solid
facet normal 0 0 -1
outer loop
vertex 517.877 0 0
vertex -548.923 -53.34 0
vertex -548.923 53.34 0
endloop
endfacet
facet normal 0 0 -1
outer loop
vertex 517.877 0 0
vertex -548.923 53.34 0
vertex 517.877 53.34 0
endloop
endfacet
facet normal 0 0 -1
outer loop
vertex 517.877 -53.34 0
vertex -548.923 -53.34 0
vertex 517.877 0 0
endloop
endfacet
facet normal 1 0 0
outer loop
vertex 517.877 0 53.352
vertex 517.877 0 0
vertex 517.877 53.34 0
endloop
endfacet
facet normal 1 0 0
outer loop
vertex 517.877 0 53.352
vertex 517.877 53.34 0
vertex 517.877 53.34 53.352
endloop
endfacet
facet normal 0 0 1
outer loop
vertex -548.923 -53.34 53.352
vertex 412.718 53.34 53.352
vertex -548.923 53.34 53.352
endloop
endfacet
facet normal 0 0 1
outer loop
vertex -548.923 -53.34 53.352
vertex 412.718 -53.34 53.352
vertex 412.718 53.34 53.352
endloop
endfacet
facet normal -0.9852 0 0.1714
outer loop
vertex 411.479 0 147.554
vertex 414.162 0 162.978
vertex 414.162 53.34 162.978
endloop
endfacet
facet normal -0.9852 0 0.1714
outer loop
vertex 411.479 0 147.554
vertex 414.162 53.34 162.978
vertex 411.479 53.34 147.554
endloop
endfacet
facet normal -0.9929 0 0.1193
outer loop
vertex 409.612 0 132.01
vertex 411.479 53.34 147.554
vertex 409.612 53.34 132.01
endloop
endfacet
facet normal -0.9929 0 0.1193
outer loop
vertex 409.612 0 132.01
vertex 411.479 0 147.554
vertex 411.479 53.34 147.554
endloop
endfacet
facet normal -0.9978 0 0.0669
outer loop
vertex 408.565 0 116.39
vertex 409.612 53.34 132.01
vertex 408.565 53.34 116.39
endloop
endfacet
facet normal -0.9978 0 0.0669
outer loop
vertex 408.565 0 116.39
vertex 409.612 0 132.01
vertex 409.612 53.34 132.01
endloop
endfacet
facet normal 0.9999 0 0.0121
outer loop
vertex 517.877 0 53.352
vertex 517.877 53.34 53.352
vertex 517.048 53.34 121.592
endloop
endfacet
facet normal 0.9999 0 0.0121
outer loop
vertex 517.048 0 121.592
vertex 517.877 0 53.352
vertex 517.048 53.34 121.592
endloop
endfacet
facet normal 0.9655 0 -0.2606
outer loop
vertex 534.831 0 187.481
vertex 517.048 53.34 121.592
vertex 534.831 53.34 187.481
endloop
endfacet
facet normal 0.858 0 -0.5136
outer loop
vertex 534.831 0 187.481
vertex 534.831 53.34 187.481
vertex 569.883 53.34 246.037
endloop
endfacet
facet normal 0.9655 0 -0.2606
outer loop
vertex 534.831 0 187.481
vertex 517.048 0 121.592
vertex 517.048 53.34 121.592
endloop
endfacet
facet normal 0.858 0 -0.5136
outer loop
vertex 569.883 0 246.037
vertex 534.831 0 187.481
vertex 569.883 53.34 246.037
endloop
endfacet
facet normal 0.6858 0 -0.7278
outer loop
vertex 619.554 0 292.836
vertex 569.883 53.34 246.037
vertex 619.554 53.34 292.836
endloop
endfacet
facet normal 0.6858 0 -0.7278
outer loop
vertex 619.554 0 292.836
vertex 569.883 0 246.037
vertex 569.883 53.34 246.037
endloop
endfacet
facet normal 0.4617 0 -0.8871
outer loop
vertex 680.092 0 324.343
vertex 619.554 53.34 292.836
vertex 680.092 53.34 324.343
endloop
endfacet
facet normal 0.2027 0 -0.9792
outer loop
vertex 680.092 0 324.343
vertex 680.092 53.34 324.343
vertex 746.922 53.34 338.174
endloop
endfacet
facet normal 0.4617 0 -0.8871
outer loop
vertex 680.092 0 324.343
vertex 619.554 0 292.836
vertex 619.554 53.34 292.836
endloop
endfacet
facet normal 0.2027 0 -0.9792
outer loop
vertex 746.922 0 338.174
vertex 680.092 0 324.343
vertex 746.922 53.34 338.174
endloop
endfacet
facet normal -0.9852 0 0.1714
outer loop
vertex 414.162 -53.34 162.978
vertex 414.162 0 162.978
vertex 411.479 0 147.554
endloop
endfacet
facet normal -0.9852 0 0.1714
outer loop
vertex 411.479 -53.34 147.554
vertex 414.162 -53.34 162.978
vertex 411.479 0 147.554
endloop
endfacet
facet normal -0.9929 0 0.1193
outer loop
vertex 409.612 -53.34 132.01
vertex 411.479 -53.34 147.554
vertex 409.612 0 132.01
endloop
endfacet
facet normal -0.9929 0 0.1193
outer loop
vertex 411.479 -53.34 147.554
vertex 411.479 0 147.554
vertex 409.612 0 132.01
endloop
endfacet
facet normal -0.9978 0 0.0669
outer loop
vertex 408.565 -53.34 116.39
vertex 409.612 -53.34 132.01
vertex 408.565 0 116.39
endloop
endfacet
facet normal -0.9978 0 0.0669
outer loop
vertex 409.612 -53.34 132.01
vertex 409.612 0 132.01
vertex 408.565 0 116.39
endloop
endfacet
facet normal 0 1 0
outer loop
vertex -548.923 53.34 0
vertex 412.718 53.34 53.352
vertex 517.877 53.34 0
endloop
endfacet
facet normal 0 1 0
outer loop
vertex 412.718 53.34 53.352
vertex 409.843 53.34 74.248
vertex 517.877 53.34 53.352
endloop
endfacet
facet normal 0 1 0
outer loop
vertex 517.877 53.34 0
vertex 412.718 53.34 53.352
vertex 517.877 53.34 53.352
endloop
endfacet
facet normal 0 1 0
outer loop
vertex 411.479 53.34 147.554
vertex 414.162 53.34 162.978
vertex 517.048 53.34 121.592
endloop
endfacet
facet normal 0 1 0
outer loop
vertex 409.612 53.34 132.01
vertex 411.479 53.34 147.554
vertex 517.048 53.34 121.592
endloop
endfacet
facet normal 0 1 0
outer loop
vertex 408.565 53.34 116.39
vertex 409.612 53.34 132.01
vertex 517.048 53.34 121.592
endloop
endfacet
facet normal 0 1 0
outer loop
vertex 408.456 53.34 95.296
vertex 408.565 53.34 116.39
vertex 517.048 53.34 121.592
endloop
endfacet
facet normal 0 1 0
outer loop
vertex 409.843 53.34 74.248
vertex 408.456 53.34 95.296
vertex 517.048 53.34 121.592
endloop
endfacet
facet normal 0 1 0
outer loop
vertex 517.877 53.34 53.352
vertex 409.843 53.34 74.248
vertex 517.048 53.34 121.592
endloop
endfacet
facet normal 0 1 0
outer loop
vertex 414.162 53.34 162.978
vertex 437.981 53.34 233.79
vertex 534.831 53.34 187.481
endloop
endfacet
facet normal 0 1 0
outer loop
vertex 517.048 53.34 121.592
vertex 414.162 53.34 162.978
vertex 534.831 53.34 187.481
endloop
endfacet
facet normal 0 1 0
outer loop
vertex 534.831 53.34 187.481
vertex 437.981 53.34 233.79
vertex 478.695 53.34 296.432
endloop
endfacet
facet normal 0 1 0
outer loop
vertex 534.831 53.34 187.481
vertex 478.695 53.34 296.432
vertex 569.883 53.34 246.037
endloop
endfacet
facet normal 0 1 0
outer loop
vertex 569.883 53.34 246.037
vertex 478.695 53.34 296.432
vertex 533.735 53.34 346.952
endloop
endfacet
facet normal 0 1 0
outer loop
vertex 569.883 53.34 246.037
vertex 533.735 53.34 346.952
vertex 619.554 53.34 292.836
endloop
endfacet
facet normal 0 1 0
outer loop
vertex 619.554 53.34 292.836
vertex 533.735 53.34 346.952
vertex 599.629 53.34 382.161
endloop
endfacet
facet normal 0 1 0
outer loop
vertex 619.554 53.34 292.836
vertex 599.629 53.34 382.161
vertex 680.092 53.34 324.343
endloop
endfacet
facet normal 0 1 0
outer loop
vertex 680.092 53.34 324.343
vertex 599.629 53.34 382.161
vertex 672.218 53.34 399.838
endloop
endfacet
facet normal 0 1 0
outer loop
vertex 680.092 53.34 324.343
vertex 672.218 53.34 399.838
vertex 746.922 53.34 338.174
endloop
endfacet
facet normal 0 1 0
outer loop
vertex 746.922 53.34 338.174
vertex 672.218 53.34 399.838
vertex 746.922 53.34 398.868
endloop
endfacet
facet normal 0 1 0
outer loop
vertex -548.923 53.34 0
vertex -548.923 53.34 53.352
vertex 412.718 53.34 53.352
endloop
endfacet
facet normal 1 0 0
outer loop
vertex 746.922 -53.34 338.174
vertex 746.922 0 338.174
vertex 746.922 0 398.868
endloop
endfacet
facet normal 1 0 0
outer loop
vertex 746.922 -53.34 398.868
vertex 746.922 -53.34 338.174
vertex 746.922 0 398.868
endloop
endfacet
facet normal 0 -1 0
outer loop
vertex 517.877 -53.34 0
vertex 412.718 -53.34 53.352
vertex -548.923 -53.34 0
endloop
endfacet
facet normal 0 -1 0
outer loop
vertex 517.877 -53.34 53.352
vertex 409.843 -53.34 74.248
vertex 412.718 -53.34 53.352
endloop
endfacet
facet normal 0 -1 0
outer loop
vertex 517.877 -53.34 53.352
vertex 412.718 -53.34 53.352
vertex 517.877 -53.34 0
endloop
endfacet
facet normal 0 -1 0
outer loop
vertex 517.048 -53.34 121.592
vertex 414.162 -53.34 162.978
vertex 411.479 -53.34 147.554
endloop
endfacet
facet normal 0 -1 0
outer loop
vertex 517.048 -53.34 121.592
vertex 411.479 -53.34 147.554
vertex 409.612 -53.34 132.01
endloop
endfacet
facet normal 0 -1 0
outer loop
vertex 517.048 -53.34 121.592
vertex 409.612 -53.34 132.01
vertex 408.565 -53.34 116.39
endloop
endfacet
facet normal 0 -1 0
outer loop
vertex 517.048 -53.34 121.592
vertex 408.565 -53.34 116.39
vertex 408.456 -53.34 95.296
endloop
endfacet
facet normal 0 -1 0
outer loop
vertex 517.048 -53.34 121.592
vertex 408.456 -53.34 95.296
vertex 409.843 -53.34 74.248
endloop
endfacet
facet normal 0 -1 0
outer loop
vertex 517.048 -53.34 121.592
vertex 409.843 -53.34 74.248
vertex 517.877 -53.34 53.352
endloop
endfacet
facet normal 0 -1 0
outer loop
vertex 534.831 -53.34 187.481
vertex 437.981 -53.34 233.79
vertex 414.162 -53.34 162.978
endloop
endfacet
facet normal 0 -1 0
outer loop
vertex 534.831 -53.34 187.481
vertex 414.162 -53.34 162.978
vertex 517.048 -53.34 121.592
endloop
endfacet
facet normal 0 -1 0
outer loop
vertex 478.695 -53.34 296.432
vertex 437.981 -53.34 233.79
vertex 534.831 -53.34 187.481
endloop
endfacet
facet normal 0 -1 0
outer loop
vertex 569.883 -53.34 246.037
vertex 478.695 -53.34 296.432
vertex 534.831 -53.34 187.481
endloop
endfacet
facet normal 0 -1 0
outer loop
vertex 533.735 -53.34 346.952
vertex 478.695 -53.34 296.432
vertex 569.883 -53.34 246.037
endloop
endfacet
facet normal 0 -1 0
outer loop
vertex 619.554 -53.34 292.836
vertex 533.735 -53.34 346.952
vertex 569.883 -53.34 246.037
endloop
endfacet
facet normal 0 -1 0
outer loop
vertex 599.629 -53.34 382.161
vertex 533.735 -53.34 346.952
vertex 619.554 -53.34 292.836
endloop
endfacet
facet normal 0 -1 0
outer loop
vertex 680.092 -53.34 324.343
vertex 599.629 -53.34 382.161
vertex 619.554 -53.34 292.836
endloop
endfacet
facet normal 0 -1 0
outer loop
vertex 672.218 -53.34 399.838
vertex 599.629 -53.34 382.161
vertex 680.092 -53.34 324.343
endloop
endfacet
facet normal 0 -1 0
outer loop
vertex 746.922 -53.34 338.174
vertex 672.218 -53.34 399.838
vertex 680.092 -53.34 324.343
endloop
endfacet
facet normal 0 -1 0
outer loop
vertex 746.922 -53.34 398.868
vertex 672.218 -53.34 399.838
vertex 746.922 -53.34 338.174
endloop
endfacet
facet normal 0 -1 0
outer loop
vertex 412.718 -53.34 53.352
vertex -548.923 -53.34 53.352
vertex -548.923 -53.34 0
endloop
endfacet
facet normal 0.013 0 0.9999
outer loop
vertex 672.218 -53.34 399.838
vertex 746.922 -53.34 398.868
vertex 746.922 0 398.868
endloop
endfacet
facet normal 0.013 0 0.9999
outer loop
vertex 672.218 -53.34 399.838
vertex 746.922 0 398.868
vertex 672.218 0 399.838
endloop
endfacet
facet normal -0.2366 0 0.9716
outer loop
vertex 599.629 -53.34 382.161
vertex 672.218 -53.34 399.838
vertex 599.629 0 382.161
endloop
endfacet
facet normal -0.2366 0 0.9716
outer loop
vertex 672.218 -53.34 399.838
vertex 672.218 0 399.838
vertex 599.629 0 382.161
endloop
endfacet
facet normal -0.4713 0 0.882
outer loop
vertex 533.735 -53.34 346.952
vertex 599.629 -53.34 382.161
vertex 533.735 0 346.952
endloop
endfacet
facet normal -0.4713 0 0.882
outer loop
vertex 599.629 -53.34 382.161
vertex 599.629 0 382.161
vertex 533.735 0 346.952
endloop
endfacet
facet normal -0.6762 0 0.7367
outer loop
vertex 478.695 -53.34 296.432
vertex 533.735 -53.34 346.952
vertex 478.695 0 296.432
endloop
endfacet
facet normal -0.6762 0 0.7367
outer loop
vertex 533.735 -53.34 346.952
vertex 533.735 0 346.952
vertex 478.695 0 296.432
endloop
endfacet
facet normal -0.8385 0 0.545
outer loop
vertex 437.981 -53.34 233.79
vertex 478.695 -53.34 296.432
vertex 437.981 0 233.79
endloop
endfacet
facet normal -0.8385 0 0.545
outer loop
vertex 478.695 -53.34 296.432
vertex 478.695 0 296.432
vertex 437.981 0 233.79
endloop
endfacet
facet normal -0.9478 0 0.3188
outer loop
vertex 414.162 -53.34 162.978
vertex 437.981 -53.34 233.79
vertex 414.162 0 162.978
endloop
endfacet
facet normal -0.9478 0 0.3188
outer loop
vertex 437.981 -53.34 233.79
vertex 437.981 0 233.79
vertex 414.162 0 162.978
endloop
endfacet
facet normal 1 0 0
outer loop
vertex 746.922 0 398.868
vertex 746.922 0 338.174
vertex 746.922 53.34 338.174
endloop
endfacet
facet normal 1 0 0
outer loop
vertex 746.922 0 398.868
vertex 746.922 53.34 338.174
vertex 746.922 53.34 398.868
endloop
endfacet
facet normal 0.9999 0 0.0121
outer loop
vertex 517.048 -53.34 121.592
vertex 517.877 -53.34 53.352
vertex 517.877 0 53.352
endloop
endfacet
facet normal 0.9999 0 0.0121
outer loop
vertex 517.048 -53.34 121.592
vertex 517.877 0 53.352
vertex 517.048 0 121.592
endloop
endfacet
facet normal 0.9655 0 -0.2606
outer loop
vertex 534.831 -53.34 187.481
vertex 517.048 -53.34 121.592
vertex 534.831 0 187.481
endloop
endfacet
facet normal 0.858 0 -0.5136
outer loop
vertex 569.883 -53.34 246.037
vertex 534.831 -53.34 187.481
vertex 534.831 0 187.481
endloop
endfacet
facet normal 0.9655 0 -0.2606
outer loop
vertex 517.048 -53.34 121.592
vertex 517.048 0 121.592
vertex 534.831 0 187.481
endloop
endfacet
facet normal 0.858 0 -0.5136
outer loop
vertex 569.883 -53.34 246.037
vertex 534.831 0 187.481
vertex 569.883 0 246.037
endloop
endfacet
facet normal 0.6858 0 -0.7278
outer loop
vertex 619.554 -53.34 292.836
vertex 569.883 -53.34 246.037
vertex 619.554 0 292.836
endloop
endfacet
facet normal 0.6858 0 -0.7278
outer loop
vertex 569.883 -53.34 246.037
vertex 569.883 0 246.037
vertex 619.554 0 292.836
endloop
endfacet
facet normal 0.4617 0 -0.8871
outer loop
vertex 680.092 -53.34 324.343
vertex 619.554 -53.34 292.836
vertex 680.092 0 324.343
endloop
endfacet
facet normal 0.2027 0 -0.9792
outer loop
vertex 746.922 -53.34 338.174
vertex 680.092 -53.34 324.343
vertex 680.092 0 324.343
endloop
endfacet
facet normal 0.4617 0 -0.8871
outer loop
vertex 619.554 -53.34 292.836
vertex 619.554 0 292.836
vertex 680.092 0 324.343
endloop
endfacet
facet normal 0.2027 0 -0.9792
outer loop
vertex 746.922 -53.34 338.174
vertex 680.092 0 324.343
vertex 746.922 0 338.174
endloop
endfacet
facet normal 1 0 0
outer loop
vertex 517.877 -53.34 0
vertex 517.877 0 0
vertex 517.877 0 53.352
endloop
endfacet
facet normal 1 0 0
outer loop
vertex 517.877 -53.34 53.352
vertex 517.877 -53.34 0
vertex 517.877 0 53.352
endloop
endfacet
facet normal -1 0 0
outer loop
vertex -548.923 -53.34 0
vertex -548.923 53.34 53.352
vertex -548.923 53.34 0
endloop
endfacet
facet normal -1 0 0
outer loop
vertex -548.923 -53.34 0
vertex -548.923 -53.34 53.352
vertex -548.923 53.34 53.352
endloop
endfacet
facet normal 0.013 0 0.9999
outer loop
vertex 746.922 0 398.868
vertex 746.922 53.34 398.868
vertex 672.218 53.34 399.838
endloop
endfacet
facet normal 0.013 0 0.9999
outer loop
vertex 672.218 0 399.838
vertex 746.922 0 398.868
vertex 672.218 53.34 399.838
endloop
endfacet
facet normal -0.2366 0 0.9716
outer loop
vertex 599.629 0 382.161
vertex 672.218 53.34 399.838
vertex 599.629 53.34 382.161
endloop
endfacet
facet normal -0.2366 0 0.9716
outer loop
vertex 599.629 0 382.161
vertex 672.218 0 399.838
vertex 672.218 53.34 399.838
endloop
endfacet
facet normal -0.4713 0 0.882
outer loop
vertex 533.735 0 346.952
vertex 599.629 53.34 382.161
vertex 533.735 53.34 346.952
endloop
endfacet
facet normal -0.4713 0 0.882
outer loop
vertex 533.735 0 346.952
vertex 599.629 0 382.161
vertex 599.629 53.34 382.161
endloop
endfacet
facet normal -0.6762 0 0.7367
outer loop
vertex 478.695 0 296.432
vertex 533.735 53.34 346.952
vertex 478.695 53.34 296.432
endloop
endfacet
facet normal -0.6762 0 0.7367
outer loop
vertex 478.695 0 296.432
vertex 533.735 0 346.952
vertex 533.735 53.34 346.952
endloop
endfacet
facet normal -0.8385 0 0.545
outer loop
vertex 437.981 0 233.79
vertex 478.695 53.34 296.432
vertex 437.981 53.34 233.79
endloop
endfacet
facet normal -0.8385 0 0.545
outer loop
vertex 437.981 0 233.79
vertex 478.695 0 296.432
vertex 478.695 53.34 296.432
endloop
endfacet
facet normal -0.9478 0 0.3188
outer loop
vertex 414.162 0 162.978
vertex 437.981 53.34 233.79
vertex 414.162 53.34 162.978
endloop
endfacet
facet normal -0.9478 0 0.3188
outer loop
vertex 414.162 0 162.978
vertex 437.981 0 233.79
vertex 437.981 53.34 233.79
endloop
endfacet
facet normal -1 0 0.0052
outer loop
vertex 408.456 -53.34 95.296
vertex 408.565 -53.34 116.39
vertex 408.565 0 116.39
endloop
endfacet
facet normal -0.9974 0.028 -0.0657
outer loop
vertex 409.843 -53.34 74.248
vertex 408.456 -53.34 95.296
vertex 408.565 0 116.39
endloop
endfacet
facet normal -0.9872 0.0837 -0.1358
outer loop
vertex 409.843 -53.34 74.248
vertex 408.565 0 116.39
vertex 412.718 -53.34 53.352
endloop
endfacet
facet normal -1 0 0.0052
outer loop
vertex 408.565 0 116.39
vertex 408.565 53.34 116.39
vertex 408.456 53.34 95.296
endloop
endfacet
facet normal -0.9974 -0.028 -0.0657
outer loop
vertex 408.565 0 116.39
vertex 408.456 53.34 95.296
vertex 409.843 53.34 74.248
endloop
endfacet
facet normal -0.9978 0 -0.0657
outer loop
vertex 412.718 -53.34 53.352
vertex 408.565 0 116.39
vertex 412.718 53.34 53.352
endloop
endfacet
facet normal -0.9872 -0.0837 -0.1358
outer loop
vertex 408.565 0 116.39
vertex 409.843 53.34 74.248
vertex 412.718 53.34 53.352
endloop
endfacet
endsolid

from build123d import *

# Parameters (mm, degrees)
F4_DEPTH = 53.34


# Not quite as in the source:
# - the program builds the solid bodies; features that only make, move or delete a surface that nothing else refers to are left out


with BuildPart() as f4:
    # F0 (on Front) → F4 (new body, symmetric)
    with BuildSketch(Plane.XZ):
        with BuildLine():
            Line((-548.9229032603, 53.3517466559), (-548.9229032603, 0))
            Line((-548.9229032603, 0), (517.8770967397, 0))
            Line((517.8770967397, 0), (517.8770967397, 53.3517466559))
            ThreePointArc((517.8770967397, 53.3517466559), (569.8826534338, 246.0368993204), (746.9217918528, 338.1742394829))
            Line((746.9217918528, 338.1742394829), (746.9217918528, 398.8678294032))
            ThreePointArc((746.9217918528, 398.8678294032), (533.7351343449, 346.9515616778), (414.162291011, 162.9782349944))
            ThreePointArc((414.162291011, 162.9782349944), (410.443214336, 139.7945515932), (408.564564689, 116.3897362155))
            ThreePointArc((408.564564689, 116.3897362155), (408.9628088542, 84.760149458), (412.718017276, 53.3517466559))
            Line((412.718017276, 53.3517466559), (111.3264834418, 53.3517466559))
            Line((111.3264834418, 53.3517466559), (78.2992156876, 53.3517466559))
            Line((78.2992156876, 53.3517466559), (0, 53.3517466559))
            Line((0, 53.3517466559), (-548.9229032603, 53.3517466559))
        make_face()
    extrude(amount=F4_DEPTH, both=True)


solid = f4.part
